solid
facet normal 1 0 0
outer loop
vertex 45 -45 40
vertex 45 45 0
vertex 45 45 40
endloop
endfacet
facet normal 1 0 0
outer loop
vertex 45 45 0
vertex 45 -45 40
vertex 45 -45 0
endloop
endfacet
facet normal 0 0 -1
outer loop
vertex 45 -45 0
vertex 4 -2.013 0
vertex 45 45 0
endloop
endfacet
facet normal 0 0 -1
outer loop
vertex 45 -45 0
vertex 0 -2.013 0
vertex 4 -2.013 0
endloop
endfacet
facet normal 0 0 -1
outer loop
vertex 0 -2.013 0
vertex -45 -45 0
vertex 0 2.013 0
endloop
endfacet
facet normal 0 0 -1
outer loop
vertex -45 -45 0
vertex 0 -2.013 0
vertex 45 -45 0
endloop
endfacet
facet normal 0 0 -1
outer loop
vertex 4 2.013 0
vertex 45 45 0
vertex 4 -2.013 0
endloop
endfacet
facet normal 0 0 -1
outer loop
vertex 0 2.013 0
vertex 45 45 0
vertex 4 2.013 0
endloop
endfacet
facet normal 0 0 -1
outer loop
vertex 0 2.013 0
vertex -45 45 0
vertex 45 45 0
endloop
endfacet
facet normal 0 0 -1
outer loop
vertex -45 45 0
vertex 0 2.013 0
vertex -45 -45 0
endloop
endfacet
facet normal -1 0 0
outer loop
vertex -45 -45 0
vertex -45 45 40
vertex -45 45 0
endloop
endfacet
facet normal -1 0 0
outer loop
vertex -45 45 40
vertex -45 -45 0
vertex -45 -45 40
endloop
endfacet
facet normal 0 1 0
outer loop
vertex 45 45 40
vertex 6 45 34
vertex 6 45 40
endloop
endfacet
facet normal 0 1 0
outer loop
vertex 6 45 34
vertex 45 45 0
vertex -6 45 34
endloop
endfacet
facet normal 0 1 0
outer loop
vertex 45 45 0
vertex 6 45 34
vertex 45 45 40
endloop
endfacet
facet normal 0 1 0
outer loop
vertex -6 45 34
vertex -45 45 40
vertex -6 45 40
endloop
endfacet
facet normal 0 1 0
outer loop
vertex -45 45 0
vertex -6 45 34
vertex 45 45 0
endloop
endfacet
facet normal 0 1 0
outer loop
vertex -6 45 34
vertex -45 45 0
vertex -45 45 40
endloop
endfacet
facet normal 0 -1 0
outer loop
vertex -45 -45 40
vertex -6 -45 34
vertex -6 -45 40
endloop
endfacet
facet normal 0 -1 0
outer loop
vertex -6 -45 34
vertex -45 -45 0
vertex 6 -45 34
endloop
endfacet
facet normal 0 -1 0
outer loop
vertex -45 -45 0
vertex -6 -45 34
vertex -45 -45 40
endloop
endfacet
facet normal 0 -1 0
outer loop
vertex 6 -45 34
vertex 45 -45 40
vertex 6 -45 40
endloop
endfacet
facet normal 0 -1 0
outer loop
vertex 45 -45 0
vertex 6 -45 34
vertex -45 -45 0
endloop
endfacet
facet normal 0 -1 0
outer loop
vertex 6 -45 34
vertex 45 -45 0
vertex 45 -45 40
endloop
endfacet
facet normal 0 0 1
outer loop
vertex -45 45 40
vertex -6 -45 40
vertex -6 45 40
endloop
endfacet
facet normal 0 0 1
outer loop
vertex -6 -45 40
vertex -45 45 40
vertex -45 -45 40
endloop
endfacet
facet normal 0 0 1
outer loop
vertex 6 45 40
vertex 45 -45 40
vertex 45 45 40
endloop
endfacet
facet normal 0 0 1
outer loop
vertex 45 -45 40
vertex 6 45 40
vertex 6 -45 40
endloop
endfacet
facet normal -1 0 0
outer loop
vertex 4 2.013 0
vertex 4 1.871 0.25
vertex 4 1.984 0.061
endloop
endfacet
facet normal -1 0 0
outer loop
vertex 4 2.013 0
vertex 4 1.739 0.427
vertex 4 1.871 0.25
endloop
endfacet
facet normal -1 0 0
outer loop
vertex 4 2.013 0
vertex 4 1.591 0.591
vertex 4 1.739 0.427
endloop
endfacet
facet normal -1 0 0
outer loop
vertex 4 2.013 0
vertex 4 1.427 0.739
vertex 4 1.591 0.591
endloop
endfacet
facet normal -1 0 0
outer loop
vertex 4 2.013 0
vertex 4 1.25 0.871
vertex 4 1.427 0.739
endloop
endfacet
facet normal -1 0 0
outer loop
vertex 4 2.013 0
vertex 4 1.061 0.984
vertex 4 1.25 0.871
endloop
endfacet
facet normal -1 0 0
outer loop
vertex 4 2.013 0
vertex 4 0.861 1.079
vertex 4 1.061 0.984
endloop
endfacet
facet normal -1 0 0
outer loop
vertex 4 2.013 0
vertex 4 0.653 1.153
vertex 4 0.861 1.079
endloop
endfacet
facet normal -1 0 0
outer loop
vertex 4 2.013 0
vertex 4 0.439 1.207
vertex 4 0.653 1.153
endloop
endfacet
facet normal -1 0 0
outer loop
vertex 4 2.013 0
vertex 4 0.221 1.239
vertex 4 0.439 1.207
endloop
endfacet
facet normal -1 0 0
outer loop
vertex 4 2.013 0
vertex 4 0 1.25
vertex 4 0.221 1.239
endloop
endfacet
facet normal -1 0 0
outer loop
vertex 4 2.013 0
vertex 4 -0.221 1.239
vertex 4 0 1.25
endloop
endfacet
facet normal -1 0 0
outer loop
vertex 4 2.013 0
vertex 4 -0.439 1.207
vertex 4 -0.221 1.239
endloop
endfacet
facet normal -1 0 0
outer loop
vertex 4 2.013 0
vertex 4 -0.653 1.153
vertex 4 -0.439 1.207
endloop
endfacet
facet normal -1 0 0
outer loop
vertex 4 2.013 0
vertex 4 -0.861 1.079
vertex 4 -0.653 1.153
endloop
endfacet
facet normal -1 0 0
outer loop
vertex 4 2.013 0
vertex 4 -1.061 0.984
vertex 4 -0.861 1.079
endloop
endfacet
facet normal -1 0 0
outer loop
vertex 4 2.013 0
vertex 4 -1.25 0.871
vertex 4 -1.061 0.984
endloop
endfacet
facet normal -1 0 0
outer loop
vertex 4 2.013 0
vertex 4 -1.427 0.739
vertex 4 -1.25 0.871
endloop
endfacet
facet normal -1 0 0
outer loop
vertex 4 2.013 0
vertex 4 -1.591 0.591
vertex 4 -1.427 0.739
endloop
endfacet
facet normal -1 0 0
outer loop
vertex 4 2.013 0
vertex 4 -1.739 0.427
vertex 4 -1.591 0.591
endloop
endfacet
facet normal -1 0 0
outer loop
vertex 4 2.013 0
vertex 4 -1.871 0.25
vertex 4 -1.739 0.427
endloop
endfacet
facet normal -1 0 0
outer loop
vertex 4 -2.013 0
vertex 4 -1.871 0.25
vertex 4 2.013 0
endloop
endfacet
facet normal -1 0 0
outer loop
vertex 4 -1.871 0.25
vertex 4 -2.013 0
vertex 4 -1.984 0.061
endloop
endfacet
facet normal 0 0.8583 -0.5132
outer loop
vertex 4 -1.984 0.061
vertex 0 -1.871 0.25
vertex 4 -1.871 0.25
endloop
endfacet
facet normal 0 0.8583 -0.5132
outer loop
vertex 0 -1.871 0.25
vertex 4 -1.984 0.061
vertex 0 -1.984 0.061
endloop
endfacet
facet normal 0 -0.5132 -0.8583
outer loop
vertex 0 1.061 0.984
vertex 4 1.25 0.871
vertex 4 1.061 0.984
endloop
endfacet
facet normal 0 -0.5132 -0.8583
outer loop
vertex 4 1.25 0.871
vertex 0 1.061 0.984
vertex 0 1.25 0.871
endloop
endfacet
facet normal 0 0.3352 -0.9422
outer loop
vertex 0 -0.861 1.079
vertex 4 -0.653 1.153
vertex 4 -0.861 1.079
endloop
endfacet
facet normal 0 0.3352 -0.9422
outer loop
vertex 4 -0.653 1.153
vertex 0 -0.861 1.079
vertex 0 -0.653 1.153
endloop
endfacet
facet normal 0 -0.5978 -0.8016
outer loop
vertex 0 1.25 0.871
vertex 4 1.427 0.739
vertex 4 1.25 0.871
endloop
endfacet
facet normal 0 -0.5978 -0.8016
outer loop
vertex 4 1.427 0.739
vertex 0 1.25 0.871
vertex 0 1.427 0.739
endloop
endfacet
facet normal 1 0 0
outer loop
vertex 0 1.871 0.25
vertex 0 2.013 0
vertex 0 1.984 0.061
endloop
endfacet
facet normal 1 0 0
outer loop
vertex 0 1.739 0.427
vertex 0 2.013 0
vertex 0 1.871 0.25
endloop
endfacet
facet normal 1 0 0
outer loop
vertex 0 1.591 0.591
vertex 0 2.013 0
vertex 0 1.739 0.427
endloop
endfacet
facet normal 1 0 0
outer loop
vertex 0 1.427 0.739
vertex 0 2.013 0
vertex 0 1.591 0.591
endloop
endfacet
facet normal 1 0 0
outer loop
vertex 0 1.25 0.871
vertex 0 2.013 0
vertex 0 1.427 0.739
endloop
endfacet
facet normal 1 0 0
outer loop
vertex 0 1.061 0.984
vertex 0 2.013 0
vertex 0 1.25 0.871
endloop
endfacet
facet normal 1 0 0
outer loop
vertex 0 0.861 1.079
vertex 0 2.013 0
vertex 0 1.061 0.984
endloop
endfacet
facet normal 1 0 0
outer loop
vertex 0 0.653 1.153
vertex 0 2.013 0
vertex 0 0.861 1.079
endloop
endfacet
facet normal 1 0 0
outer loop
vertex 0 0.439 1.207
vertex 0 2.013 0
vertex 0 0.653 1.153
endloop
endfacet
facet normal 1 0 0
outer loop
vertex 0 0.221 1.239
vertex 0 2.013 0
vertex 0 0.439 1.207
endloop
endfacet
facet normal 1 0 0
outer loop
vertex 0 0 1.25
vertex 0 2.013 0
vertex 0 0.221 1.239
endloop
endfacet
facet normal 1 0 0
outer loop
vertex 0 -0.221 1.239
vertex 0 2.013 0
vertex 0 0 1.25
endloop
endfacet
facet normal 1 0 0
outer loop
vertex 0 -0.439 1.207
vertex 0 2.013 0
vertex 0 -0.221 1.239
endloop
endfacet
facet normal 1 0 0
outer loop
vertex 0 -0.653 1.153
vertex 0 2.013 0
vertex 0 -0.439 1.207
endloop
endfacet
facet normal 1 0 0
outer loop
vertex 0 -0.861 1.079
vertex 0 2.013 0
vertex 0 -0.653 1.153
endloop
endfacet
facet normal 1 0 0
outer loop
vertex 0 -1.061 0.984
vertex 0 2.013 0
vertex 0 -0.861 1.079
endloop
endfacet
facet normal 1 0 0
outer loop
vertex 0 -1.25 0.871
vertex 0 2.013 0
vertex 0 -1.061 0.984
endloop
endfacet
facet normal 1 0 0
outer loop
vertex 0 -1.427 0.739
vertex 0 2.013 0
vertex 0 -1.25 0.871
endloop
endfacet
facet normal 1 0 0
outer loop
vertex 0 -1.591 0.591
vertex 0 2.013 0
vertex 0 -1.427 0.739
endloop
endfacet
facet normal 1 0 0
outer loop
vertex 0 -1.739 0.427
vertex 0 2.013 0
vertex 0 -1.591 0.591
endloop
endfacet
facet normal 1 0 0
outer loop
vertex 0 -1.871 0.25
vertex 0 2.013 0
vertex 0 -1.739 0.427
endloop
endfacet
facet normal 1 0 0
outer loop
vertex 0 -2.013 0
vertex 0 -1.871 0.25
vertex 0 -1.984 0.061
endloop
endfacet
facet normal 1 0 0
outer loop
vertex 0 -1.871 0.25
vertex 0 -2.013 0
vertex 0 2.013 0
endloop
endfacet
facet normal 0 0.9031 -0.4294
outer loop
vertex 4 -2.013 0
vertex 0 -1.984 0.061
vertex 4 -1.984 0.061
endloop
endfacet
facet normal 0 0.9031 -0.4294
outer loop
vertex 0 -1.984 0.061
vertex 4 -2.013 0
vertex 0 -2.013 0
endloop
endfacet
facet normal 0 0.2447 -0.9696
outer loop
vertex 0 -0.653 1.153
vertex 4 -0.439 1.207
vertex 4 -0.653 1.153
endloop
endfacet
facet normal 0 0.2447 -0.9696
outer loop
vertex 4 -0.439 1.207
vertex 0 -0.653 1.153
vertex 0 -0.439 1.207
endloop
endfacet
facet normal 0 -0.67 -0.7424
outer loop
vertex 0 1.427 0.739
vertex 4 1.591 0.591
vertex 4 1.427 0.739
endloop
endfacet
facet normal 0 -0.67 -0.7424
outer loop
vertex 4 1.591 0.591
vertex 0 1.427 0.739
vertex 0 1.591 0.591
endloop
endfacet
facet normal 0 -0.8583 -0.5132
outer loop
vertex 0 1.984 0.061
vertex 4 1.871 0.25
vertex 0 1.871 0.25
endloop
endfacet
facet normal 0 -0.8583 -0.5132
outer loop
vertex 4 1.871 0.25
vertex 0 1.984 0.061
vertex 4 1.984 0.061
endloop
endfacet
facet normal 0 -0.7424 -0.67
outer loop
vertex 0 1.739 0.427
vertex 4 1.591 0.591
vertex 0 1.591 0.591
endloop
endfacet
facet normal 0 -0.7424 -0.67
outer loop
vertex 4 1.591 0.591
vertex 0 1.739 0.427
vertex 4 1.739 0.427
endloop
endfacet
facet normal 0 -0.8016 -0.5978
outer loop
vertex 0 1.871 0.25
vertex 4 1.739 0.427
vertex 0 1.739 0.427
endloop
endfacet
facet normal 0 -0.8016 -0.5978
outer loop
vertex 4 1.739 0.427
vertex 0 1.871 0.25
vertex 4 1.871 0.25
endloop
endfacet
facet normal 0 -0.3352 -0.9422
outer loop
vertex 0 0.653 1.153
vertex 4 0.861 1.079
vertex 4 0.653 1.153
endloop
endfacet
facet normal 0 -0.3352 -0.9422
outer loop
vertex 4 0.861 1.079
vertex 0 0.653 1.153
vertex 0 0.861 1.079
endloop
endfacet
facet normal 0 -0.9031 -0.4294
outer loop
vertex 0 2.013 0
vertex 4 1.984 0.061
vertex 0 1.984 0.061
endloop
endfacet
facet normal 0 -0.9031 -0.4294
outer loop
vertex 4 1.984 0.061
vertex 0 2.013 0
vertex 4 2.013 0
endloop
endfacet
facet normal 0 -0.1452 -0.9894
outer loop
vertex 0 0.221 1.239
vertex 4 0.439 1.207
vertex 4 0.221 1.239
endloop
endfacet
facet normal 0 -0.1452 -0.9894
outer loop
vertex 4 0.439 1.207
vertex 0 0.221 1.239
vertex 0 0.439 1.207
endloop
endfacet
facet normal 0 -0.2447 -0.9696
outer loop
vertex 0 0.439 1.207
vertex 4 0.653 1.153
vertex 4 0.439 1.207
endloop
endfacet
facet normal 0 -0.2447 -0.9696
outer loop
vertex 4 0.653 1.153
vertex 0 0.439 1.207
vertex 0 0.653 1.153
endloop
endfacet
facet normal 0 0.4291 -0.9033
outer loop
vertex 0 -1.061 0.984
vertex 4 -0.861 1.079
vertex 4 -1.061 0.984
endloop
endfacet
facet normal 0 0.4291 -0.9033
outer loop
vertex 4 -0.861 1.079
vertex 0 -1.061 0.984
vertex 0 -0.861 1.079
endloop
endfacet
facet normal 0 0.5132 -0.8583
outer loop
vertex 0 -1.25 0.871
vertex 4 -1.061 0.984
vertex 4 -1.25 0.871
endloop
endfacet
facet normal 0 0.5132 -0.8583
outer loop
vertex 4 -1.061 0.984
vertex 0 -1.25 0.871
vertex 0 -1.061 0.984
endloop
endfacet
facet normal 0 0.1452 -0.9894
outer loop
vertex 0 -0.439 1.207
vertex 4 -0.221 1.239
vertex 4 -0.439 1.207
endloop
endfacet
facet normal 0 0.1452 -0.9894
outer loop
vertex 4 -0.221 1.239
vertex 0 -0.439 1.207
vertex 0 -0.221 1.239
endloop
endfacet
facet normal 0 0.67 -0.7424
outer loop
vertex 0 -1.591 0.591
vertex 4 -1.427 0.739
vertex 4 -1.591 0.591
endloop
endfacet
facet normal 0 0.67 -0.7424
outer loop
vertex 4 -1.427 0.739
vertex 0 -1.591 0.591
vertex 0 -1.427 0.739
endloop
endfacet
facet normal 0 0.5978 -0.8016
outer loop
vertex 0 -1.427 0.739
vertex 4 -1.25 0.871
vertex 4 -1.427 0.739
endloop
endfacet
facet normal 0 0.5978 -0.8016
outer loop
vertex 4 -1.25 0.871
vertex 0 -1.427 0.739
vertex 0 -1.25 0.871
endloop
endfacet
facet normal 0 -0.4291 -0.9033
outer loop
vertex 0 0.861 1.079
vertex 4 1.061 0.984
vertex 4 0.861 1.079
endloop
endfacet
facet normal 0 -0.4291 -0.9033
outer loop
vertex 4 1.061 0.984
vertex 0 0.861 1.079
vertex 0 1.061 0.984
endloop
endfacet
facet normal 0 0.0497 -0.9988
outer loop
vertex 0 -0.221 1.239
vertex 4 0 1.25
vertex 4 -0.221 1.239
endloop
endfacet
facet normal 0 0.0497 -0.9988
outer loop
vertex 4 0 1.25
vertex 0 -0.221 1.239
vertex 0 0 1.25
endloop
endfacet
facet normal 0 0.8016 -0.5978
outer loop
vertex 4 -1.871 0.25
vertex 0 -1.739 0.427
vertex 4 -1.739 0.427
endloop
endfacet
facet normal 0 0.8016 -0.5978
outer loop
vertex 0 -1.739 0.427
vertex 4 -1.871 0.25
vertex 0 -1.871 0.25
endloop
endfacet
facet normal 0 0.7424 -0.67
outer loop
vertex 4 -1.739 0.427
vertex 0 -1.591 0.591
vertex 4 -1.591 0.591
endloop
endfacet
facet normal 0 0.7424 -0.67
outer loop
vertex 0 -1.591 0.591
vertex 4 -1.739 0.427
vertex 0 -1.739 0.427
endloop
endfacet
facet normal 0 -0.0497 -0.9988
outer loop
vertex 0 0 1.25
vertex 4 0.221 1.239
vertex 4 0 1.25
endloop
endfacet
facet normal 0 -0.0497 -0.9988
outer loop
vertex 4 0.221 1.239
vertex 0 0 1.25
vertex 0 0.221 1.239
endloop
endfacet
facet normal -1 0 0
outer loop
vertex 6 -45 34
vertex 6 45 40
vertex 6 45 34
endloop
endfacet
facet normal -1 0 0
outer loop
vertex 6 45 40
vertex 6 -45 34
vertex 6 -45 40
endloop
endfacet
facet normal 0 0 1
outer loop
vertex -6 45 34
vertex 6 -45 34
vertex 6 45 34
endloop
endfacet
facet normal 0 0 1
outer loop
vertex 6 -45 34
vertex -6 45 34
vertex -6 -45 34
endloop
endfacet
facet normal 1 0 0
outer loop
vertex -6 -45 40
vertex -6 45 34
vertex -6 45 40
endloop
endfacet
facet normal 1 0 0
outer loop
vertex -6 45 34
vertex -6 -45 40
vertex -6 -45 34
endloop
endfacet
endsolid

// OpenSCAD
// Housing for a DIY magnetic stirrer built from an 80 mm PC case fan
// Printed upside down: top plate on the bed, box open at the top.

$fn = 64;

// ---- Dimensions (mm) ----
top_t      = 2;    // top plate thickness (z = 0 to 2)
wall_t     = 2.5;  // wall thickness
box_h      = 40;   // total height of box walls (z = 0 to 40)
outer_x    = 90;   // outer size along X
outer_y    = 90;   // outer size along Y
screw_n    = 4;    // number of screw holes
screw_d    = 4.5;  // screw hole diameter (M4)
screw_pitch = 71.5;// square pitch of screw holes (X and Y)
cable_w    = 12;   // width of power cable notch
cable_reach = 8;   // notch depth from open edge (z = 32 to 40)

// ---- Model ----
difference() {
    // Outer box
    union() {
        // Top plate on the bed
        translate([-outer_x/2, -outer_y/2, 0])
            cube([outer_x, outer_y, top_t]);
        // Four walls rising from the plate
        translate([-outer_x/2, -outer_y/2, top_t])
            cube([outer_x, outer_y, box_h - top_t]);
    }

    // Four M4 screw holes through the top plate, centred on the plate
    for (i = [0 : screw_n - 1])
        translate([0, 0, -1])
            rotate([0, 90, 0])
                translate([screw_pitch/2 * [cos(i * 90), sin(i * 90)], 0])
                    cylinder(d = screw_d, h = top_t + 2);

    // Power cable notch in one wall, centred along the wall
    translate([-cable_w/2, -outer_y/2, top_t + box_h - cable_reach])
        cube([cable_w, outer_y + 2, cable_reach]);
}
